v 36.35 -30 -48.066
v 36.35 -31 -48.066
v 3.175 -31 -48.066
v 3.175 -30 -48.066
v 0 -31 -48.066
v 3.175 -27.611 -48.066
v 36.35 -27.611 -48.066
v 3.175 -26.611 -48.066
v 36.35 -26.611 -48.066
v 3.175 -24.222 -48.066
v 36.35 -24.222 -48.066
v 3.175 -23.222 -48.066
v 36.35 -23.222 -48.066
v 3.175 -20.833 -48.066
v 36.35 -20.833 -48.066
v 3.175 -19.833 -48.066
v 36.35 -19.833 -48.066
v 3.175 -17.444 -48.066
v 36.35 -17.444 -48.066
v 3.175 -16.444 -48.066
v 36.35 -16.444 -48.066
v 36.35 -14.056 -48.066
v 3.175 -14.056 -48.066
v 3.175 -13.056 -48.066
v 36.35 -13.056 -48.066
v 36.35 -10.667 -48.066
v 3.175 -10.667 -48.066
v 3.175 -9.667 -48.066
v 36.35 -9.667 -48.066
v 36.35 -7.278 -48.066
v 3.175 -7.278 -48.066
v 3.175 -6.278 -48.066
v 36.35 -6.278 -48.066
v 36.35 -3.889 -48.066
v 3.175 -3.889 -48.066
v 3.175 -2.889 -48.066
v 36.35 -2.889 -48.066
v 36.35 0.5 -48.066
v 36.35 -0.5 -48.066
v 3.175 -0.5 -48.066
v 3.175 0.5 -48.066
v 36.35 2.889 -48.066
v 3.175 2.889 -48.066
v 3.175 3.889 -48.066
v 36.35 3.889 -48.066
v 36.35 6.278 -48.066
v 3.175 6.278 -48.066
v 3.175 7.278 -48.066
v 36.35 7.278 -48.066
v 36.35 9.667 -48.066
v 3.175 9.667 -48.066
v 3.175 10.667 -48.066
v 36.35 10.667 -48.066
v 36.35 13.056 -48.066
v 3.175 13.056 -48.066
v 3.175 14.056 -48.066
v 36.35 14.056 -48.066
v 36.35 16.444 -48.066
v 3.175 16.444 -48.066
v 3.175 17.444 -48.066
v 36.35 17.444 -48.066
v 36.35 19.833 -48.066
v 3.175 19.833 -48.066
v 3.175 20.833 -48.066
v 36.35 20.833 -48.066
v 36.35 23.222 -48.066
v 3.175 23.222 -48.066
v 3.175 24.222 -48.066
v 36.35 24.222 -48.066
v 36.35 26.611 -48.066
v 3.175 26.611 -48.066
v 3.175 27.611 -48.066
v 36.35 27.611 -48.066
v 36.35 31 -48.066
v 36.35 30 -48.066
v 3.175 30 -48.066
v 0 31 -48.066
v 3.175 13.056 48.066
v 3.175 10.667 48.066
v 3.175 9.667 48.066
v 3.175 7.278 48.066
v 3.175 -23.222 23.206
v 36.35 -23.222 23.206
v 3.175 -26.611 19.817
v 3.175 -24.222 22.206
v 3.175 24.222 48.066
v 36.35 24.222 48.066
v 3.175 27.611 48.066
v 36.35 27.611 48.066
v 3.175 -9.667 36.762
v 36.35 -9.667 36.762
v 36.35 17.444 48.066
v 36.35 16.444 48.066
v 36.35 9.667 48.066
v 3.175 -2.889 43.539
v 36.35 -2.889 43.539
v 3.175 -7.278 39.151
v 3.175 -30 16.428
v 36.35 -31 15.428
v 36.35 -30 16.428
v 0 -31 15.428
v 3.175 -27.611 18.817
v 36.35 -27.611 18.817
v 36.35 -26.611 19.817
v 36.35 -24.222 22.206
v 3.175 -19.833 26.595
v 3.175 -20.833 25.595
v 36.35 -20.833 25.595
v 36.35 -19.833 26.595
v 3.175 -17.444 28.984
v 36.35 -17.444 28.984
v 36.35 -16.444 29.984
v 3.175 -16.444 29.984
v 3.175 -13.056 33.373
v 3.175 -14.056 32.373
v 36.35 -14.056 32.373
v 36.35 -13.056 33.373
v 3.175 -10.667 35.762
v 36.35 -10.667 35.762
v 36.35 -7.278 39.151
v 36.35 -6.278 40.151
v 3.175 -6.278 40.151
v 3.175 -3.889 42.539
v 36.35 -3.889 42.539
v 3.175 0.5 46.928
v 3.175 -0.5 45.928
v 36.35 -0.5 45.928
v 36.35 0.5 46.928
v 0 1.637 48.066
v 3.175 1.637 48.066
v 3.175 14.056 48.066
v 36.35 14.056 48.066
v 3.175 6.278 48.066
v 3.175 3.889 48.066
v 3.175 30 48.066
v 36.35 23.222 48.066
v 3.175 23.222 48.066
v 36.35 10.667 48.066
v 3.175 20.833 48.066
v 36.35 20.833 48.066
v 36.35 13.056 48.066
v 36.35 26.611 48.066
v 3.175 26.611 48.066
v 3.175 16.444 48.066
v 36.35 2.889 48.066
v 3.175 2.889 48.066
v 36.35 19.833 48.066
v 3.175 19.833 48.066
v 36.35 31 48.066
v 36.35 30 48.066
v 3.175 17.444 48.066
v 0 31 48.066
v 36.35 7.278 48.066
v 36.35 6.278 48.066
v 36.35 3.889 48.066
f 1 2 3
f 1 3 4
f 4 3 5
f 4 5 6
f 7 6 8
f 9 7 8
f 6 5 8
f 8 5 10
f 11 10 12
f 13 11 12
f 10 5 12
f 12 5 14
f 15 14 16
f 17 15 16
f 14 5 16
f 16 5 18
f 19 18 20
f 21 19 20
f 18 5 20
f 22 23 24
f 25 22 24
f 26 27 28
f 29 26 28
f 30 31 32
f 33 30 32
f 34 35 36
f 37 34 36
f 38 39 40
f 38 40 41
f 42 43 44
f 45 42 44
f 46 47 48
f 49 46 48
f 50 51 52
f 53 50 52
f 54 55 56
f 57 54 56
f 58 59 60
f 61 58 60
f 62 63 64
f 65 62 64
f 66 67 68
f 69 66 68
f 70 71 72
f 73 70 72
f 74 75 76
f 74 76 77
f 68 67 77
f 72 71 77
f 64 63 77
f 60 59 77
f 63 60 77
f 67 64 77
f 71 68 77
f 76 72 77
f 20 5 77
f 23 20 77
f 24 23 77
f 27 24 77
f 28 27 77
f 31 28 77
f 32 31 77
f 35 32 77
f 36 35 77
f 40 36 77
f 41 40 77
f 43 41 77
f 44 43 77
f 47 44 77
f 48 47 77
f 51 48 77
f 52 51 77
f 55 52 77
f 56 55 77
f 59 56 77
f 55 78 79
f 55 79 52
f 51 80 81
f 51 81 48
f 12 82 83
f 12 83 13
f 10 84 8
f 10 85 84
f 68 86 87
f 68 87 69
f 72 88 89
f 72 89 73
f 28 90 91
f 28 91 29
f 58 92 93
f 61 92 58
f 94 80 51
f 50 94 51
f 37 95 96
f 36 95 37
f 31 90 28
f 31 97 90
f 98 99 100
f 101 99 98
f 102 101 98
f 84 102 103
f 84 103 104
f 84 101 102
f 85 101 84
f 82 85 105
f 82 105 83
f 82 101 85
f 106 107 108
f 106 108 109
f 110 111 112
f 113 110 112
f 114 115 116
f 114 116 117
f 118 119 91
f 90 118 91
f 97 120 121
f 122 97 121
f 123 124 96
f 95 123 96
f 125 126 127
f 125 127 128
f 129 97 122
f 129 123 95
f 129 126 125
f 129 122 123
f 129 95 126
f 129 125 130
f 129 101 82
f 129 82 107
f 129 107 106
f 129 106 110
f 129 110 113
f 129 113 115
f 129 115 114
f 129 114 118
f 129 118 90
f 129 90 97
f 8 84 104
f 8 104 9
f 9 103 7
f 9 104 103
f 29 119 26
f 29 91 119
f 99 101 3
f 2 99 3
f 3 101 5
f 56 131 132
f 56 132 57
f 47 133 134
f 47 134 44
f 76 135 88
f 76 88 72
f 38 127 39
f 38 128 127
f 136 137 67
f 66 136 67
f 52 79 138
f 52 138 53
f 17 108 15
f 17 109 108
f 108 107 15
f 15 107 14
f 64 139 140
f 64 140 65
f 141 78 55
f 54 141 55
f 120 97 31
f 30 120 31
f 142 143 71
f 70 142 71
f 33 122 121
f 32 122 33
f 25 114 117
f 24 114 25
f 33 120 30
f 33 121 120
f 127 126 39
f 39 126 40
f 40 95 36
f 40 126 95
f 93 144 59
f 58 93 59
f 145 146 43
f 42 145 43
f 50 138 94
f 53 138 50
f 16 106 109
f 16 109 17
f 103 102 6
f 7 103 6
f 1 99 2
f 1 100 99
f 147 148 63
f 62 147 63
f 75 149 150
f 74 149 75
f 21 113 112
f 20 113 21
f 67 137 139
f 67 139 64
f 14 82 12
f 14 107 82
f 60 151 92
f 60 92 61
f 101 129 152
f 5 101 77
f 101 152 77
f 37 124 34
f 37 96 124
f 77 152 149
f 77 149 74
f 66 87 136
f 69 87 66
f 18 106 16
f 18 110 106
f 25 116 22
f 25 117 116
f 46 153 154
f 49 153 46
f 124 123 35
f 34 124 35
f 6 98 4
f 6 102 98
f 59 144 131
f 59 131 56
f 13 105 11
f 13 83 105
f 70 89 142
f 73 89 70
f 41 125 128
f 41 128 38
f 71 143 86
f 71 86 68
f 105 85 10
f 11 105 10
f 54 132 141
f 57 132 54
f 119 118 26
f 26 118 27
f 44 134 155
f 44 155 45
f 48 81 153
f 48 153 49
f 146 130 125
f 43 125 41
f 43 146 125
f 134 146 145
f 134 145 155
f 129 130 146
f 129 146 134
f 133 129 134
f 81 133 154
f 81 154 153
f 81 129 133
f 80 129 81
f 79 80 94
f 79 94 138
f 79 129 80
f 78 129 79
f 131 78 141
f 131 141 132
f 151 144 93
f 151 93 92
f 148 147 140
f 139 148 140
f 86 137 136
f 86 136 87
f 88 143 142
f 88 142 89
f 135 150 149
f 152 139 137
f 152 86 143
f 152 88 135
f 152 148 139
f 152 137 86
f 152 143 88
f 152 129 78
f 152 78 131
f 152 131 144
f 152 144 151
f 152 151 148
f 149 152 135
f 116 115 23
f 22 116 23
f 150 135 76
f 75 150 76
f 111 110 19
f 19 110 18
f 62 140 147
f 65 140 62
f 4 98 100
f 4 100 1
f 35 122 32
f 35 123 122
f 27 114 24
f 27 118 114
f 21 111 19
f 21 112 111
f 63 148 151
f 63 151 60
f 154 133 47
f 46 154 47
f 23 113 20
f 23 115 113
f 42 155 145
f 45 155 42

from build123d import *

# Parameters (mm, degrees)
SKETCH1_W               = 96.131545064
SKETCH1_H               = 62
BOSS_EXTRUDE1_DEPTH     = 3.175
SKETCH2_W               = 96.131545064
SKETCH2_H               = 1
EXTRUDE_THIN1_DEPTH     = 33.175
LPATTERN1_COUNT         = 19
LPATTERN1_PITCH         = 3.388888889
CUT_EXTRUDE1_DEPTH      = 67.120338127
CUT_EXTRUDE1_DEPTH_BACK = 67.120338127


with BuildPart() as part:
    # Sketch1 → Boss-Extrude1 (new body)
    with BuildSketch(Plane(origin=(0, 0, 0), x_dir=(0, 0, -1), z_dir=(1, 0, 0))):
        Rectangle(SKETCH1_W, SKETCH1_H)
    extrude(amount=BOSS_EXTRUDE1_DEPTH)

    # Sketch2 → Extrude-Thin1 (add)
    with BuildSketch(Plane(origin=(3.175, 0, 0), x_dir=(0, 0, -1), z_dir=(1, 0, 0))):
        with Locations((0, 30.5)):
            Rectangle(SKETCH2_W, SKETCH2_H)
    extrude_thin1 = extrude(amount=EXTRUDE_THIN1_DEPTH)

    # LPattern1: Extrude-Thin1 ×19
    with Locations(*[(0, -i * LPATTERN1_PITCH, 0) for i in range(1, LPATTERN1_COUNT)]):
        add(extrude_thin1)

    # Sketch3 → Cut-Extrude1 (cut, two sides: drawn at the far end of the back side and taken through both)
    with BuildSketch(Plane(origin=(3.175, 0, 0), x_dir=(0, 0, -1), z_dir=(1, 0, 0)).offset(-CUT_EXTRUDE1_DEPTH_BACK)):
        Polygon((-0.096506061, -46.331819287), (-55.483661094, 9.055335745), (-88.096831181, -23.557834342), (-32.709676149, -78.944989375), align=None)
    extrude(amount=CUT_EXTRUDE1_DEPTH + CUT_EXTRUDE1_DEPTH_BACK, mode=Mode.SUBTRACT)


solid = part.part
